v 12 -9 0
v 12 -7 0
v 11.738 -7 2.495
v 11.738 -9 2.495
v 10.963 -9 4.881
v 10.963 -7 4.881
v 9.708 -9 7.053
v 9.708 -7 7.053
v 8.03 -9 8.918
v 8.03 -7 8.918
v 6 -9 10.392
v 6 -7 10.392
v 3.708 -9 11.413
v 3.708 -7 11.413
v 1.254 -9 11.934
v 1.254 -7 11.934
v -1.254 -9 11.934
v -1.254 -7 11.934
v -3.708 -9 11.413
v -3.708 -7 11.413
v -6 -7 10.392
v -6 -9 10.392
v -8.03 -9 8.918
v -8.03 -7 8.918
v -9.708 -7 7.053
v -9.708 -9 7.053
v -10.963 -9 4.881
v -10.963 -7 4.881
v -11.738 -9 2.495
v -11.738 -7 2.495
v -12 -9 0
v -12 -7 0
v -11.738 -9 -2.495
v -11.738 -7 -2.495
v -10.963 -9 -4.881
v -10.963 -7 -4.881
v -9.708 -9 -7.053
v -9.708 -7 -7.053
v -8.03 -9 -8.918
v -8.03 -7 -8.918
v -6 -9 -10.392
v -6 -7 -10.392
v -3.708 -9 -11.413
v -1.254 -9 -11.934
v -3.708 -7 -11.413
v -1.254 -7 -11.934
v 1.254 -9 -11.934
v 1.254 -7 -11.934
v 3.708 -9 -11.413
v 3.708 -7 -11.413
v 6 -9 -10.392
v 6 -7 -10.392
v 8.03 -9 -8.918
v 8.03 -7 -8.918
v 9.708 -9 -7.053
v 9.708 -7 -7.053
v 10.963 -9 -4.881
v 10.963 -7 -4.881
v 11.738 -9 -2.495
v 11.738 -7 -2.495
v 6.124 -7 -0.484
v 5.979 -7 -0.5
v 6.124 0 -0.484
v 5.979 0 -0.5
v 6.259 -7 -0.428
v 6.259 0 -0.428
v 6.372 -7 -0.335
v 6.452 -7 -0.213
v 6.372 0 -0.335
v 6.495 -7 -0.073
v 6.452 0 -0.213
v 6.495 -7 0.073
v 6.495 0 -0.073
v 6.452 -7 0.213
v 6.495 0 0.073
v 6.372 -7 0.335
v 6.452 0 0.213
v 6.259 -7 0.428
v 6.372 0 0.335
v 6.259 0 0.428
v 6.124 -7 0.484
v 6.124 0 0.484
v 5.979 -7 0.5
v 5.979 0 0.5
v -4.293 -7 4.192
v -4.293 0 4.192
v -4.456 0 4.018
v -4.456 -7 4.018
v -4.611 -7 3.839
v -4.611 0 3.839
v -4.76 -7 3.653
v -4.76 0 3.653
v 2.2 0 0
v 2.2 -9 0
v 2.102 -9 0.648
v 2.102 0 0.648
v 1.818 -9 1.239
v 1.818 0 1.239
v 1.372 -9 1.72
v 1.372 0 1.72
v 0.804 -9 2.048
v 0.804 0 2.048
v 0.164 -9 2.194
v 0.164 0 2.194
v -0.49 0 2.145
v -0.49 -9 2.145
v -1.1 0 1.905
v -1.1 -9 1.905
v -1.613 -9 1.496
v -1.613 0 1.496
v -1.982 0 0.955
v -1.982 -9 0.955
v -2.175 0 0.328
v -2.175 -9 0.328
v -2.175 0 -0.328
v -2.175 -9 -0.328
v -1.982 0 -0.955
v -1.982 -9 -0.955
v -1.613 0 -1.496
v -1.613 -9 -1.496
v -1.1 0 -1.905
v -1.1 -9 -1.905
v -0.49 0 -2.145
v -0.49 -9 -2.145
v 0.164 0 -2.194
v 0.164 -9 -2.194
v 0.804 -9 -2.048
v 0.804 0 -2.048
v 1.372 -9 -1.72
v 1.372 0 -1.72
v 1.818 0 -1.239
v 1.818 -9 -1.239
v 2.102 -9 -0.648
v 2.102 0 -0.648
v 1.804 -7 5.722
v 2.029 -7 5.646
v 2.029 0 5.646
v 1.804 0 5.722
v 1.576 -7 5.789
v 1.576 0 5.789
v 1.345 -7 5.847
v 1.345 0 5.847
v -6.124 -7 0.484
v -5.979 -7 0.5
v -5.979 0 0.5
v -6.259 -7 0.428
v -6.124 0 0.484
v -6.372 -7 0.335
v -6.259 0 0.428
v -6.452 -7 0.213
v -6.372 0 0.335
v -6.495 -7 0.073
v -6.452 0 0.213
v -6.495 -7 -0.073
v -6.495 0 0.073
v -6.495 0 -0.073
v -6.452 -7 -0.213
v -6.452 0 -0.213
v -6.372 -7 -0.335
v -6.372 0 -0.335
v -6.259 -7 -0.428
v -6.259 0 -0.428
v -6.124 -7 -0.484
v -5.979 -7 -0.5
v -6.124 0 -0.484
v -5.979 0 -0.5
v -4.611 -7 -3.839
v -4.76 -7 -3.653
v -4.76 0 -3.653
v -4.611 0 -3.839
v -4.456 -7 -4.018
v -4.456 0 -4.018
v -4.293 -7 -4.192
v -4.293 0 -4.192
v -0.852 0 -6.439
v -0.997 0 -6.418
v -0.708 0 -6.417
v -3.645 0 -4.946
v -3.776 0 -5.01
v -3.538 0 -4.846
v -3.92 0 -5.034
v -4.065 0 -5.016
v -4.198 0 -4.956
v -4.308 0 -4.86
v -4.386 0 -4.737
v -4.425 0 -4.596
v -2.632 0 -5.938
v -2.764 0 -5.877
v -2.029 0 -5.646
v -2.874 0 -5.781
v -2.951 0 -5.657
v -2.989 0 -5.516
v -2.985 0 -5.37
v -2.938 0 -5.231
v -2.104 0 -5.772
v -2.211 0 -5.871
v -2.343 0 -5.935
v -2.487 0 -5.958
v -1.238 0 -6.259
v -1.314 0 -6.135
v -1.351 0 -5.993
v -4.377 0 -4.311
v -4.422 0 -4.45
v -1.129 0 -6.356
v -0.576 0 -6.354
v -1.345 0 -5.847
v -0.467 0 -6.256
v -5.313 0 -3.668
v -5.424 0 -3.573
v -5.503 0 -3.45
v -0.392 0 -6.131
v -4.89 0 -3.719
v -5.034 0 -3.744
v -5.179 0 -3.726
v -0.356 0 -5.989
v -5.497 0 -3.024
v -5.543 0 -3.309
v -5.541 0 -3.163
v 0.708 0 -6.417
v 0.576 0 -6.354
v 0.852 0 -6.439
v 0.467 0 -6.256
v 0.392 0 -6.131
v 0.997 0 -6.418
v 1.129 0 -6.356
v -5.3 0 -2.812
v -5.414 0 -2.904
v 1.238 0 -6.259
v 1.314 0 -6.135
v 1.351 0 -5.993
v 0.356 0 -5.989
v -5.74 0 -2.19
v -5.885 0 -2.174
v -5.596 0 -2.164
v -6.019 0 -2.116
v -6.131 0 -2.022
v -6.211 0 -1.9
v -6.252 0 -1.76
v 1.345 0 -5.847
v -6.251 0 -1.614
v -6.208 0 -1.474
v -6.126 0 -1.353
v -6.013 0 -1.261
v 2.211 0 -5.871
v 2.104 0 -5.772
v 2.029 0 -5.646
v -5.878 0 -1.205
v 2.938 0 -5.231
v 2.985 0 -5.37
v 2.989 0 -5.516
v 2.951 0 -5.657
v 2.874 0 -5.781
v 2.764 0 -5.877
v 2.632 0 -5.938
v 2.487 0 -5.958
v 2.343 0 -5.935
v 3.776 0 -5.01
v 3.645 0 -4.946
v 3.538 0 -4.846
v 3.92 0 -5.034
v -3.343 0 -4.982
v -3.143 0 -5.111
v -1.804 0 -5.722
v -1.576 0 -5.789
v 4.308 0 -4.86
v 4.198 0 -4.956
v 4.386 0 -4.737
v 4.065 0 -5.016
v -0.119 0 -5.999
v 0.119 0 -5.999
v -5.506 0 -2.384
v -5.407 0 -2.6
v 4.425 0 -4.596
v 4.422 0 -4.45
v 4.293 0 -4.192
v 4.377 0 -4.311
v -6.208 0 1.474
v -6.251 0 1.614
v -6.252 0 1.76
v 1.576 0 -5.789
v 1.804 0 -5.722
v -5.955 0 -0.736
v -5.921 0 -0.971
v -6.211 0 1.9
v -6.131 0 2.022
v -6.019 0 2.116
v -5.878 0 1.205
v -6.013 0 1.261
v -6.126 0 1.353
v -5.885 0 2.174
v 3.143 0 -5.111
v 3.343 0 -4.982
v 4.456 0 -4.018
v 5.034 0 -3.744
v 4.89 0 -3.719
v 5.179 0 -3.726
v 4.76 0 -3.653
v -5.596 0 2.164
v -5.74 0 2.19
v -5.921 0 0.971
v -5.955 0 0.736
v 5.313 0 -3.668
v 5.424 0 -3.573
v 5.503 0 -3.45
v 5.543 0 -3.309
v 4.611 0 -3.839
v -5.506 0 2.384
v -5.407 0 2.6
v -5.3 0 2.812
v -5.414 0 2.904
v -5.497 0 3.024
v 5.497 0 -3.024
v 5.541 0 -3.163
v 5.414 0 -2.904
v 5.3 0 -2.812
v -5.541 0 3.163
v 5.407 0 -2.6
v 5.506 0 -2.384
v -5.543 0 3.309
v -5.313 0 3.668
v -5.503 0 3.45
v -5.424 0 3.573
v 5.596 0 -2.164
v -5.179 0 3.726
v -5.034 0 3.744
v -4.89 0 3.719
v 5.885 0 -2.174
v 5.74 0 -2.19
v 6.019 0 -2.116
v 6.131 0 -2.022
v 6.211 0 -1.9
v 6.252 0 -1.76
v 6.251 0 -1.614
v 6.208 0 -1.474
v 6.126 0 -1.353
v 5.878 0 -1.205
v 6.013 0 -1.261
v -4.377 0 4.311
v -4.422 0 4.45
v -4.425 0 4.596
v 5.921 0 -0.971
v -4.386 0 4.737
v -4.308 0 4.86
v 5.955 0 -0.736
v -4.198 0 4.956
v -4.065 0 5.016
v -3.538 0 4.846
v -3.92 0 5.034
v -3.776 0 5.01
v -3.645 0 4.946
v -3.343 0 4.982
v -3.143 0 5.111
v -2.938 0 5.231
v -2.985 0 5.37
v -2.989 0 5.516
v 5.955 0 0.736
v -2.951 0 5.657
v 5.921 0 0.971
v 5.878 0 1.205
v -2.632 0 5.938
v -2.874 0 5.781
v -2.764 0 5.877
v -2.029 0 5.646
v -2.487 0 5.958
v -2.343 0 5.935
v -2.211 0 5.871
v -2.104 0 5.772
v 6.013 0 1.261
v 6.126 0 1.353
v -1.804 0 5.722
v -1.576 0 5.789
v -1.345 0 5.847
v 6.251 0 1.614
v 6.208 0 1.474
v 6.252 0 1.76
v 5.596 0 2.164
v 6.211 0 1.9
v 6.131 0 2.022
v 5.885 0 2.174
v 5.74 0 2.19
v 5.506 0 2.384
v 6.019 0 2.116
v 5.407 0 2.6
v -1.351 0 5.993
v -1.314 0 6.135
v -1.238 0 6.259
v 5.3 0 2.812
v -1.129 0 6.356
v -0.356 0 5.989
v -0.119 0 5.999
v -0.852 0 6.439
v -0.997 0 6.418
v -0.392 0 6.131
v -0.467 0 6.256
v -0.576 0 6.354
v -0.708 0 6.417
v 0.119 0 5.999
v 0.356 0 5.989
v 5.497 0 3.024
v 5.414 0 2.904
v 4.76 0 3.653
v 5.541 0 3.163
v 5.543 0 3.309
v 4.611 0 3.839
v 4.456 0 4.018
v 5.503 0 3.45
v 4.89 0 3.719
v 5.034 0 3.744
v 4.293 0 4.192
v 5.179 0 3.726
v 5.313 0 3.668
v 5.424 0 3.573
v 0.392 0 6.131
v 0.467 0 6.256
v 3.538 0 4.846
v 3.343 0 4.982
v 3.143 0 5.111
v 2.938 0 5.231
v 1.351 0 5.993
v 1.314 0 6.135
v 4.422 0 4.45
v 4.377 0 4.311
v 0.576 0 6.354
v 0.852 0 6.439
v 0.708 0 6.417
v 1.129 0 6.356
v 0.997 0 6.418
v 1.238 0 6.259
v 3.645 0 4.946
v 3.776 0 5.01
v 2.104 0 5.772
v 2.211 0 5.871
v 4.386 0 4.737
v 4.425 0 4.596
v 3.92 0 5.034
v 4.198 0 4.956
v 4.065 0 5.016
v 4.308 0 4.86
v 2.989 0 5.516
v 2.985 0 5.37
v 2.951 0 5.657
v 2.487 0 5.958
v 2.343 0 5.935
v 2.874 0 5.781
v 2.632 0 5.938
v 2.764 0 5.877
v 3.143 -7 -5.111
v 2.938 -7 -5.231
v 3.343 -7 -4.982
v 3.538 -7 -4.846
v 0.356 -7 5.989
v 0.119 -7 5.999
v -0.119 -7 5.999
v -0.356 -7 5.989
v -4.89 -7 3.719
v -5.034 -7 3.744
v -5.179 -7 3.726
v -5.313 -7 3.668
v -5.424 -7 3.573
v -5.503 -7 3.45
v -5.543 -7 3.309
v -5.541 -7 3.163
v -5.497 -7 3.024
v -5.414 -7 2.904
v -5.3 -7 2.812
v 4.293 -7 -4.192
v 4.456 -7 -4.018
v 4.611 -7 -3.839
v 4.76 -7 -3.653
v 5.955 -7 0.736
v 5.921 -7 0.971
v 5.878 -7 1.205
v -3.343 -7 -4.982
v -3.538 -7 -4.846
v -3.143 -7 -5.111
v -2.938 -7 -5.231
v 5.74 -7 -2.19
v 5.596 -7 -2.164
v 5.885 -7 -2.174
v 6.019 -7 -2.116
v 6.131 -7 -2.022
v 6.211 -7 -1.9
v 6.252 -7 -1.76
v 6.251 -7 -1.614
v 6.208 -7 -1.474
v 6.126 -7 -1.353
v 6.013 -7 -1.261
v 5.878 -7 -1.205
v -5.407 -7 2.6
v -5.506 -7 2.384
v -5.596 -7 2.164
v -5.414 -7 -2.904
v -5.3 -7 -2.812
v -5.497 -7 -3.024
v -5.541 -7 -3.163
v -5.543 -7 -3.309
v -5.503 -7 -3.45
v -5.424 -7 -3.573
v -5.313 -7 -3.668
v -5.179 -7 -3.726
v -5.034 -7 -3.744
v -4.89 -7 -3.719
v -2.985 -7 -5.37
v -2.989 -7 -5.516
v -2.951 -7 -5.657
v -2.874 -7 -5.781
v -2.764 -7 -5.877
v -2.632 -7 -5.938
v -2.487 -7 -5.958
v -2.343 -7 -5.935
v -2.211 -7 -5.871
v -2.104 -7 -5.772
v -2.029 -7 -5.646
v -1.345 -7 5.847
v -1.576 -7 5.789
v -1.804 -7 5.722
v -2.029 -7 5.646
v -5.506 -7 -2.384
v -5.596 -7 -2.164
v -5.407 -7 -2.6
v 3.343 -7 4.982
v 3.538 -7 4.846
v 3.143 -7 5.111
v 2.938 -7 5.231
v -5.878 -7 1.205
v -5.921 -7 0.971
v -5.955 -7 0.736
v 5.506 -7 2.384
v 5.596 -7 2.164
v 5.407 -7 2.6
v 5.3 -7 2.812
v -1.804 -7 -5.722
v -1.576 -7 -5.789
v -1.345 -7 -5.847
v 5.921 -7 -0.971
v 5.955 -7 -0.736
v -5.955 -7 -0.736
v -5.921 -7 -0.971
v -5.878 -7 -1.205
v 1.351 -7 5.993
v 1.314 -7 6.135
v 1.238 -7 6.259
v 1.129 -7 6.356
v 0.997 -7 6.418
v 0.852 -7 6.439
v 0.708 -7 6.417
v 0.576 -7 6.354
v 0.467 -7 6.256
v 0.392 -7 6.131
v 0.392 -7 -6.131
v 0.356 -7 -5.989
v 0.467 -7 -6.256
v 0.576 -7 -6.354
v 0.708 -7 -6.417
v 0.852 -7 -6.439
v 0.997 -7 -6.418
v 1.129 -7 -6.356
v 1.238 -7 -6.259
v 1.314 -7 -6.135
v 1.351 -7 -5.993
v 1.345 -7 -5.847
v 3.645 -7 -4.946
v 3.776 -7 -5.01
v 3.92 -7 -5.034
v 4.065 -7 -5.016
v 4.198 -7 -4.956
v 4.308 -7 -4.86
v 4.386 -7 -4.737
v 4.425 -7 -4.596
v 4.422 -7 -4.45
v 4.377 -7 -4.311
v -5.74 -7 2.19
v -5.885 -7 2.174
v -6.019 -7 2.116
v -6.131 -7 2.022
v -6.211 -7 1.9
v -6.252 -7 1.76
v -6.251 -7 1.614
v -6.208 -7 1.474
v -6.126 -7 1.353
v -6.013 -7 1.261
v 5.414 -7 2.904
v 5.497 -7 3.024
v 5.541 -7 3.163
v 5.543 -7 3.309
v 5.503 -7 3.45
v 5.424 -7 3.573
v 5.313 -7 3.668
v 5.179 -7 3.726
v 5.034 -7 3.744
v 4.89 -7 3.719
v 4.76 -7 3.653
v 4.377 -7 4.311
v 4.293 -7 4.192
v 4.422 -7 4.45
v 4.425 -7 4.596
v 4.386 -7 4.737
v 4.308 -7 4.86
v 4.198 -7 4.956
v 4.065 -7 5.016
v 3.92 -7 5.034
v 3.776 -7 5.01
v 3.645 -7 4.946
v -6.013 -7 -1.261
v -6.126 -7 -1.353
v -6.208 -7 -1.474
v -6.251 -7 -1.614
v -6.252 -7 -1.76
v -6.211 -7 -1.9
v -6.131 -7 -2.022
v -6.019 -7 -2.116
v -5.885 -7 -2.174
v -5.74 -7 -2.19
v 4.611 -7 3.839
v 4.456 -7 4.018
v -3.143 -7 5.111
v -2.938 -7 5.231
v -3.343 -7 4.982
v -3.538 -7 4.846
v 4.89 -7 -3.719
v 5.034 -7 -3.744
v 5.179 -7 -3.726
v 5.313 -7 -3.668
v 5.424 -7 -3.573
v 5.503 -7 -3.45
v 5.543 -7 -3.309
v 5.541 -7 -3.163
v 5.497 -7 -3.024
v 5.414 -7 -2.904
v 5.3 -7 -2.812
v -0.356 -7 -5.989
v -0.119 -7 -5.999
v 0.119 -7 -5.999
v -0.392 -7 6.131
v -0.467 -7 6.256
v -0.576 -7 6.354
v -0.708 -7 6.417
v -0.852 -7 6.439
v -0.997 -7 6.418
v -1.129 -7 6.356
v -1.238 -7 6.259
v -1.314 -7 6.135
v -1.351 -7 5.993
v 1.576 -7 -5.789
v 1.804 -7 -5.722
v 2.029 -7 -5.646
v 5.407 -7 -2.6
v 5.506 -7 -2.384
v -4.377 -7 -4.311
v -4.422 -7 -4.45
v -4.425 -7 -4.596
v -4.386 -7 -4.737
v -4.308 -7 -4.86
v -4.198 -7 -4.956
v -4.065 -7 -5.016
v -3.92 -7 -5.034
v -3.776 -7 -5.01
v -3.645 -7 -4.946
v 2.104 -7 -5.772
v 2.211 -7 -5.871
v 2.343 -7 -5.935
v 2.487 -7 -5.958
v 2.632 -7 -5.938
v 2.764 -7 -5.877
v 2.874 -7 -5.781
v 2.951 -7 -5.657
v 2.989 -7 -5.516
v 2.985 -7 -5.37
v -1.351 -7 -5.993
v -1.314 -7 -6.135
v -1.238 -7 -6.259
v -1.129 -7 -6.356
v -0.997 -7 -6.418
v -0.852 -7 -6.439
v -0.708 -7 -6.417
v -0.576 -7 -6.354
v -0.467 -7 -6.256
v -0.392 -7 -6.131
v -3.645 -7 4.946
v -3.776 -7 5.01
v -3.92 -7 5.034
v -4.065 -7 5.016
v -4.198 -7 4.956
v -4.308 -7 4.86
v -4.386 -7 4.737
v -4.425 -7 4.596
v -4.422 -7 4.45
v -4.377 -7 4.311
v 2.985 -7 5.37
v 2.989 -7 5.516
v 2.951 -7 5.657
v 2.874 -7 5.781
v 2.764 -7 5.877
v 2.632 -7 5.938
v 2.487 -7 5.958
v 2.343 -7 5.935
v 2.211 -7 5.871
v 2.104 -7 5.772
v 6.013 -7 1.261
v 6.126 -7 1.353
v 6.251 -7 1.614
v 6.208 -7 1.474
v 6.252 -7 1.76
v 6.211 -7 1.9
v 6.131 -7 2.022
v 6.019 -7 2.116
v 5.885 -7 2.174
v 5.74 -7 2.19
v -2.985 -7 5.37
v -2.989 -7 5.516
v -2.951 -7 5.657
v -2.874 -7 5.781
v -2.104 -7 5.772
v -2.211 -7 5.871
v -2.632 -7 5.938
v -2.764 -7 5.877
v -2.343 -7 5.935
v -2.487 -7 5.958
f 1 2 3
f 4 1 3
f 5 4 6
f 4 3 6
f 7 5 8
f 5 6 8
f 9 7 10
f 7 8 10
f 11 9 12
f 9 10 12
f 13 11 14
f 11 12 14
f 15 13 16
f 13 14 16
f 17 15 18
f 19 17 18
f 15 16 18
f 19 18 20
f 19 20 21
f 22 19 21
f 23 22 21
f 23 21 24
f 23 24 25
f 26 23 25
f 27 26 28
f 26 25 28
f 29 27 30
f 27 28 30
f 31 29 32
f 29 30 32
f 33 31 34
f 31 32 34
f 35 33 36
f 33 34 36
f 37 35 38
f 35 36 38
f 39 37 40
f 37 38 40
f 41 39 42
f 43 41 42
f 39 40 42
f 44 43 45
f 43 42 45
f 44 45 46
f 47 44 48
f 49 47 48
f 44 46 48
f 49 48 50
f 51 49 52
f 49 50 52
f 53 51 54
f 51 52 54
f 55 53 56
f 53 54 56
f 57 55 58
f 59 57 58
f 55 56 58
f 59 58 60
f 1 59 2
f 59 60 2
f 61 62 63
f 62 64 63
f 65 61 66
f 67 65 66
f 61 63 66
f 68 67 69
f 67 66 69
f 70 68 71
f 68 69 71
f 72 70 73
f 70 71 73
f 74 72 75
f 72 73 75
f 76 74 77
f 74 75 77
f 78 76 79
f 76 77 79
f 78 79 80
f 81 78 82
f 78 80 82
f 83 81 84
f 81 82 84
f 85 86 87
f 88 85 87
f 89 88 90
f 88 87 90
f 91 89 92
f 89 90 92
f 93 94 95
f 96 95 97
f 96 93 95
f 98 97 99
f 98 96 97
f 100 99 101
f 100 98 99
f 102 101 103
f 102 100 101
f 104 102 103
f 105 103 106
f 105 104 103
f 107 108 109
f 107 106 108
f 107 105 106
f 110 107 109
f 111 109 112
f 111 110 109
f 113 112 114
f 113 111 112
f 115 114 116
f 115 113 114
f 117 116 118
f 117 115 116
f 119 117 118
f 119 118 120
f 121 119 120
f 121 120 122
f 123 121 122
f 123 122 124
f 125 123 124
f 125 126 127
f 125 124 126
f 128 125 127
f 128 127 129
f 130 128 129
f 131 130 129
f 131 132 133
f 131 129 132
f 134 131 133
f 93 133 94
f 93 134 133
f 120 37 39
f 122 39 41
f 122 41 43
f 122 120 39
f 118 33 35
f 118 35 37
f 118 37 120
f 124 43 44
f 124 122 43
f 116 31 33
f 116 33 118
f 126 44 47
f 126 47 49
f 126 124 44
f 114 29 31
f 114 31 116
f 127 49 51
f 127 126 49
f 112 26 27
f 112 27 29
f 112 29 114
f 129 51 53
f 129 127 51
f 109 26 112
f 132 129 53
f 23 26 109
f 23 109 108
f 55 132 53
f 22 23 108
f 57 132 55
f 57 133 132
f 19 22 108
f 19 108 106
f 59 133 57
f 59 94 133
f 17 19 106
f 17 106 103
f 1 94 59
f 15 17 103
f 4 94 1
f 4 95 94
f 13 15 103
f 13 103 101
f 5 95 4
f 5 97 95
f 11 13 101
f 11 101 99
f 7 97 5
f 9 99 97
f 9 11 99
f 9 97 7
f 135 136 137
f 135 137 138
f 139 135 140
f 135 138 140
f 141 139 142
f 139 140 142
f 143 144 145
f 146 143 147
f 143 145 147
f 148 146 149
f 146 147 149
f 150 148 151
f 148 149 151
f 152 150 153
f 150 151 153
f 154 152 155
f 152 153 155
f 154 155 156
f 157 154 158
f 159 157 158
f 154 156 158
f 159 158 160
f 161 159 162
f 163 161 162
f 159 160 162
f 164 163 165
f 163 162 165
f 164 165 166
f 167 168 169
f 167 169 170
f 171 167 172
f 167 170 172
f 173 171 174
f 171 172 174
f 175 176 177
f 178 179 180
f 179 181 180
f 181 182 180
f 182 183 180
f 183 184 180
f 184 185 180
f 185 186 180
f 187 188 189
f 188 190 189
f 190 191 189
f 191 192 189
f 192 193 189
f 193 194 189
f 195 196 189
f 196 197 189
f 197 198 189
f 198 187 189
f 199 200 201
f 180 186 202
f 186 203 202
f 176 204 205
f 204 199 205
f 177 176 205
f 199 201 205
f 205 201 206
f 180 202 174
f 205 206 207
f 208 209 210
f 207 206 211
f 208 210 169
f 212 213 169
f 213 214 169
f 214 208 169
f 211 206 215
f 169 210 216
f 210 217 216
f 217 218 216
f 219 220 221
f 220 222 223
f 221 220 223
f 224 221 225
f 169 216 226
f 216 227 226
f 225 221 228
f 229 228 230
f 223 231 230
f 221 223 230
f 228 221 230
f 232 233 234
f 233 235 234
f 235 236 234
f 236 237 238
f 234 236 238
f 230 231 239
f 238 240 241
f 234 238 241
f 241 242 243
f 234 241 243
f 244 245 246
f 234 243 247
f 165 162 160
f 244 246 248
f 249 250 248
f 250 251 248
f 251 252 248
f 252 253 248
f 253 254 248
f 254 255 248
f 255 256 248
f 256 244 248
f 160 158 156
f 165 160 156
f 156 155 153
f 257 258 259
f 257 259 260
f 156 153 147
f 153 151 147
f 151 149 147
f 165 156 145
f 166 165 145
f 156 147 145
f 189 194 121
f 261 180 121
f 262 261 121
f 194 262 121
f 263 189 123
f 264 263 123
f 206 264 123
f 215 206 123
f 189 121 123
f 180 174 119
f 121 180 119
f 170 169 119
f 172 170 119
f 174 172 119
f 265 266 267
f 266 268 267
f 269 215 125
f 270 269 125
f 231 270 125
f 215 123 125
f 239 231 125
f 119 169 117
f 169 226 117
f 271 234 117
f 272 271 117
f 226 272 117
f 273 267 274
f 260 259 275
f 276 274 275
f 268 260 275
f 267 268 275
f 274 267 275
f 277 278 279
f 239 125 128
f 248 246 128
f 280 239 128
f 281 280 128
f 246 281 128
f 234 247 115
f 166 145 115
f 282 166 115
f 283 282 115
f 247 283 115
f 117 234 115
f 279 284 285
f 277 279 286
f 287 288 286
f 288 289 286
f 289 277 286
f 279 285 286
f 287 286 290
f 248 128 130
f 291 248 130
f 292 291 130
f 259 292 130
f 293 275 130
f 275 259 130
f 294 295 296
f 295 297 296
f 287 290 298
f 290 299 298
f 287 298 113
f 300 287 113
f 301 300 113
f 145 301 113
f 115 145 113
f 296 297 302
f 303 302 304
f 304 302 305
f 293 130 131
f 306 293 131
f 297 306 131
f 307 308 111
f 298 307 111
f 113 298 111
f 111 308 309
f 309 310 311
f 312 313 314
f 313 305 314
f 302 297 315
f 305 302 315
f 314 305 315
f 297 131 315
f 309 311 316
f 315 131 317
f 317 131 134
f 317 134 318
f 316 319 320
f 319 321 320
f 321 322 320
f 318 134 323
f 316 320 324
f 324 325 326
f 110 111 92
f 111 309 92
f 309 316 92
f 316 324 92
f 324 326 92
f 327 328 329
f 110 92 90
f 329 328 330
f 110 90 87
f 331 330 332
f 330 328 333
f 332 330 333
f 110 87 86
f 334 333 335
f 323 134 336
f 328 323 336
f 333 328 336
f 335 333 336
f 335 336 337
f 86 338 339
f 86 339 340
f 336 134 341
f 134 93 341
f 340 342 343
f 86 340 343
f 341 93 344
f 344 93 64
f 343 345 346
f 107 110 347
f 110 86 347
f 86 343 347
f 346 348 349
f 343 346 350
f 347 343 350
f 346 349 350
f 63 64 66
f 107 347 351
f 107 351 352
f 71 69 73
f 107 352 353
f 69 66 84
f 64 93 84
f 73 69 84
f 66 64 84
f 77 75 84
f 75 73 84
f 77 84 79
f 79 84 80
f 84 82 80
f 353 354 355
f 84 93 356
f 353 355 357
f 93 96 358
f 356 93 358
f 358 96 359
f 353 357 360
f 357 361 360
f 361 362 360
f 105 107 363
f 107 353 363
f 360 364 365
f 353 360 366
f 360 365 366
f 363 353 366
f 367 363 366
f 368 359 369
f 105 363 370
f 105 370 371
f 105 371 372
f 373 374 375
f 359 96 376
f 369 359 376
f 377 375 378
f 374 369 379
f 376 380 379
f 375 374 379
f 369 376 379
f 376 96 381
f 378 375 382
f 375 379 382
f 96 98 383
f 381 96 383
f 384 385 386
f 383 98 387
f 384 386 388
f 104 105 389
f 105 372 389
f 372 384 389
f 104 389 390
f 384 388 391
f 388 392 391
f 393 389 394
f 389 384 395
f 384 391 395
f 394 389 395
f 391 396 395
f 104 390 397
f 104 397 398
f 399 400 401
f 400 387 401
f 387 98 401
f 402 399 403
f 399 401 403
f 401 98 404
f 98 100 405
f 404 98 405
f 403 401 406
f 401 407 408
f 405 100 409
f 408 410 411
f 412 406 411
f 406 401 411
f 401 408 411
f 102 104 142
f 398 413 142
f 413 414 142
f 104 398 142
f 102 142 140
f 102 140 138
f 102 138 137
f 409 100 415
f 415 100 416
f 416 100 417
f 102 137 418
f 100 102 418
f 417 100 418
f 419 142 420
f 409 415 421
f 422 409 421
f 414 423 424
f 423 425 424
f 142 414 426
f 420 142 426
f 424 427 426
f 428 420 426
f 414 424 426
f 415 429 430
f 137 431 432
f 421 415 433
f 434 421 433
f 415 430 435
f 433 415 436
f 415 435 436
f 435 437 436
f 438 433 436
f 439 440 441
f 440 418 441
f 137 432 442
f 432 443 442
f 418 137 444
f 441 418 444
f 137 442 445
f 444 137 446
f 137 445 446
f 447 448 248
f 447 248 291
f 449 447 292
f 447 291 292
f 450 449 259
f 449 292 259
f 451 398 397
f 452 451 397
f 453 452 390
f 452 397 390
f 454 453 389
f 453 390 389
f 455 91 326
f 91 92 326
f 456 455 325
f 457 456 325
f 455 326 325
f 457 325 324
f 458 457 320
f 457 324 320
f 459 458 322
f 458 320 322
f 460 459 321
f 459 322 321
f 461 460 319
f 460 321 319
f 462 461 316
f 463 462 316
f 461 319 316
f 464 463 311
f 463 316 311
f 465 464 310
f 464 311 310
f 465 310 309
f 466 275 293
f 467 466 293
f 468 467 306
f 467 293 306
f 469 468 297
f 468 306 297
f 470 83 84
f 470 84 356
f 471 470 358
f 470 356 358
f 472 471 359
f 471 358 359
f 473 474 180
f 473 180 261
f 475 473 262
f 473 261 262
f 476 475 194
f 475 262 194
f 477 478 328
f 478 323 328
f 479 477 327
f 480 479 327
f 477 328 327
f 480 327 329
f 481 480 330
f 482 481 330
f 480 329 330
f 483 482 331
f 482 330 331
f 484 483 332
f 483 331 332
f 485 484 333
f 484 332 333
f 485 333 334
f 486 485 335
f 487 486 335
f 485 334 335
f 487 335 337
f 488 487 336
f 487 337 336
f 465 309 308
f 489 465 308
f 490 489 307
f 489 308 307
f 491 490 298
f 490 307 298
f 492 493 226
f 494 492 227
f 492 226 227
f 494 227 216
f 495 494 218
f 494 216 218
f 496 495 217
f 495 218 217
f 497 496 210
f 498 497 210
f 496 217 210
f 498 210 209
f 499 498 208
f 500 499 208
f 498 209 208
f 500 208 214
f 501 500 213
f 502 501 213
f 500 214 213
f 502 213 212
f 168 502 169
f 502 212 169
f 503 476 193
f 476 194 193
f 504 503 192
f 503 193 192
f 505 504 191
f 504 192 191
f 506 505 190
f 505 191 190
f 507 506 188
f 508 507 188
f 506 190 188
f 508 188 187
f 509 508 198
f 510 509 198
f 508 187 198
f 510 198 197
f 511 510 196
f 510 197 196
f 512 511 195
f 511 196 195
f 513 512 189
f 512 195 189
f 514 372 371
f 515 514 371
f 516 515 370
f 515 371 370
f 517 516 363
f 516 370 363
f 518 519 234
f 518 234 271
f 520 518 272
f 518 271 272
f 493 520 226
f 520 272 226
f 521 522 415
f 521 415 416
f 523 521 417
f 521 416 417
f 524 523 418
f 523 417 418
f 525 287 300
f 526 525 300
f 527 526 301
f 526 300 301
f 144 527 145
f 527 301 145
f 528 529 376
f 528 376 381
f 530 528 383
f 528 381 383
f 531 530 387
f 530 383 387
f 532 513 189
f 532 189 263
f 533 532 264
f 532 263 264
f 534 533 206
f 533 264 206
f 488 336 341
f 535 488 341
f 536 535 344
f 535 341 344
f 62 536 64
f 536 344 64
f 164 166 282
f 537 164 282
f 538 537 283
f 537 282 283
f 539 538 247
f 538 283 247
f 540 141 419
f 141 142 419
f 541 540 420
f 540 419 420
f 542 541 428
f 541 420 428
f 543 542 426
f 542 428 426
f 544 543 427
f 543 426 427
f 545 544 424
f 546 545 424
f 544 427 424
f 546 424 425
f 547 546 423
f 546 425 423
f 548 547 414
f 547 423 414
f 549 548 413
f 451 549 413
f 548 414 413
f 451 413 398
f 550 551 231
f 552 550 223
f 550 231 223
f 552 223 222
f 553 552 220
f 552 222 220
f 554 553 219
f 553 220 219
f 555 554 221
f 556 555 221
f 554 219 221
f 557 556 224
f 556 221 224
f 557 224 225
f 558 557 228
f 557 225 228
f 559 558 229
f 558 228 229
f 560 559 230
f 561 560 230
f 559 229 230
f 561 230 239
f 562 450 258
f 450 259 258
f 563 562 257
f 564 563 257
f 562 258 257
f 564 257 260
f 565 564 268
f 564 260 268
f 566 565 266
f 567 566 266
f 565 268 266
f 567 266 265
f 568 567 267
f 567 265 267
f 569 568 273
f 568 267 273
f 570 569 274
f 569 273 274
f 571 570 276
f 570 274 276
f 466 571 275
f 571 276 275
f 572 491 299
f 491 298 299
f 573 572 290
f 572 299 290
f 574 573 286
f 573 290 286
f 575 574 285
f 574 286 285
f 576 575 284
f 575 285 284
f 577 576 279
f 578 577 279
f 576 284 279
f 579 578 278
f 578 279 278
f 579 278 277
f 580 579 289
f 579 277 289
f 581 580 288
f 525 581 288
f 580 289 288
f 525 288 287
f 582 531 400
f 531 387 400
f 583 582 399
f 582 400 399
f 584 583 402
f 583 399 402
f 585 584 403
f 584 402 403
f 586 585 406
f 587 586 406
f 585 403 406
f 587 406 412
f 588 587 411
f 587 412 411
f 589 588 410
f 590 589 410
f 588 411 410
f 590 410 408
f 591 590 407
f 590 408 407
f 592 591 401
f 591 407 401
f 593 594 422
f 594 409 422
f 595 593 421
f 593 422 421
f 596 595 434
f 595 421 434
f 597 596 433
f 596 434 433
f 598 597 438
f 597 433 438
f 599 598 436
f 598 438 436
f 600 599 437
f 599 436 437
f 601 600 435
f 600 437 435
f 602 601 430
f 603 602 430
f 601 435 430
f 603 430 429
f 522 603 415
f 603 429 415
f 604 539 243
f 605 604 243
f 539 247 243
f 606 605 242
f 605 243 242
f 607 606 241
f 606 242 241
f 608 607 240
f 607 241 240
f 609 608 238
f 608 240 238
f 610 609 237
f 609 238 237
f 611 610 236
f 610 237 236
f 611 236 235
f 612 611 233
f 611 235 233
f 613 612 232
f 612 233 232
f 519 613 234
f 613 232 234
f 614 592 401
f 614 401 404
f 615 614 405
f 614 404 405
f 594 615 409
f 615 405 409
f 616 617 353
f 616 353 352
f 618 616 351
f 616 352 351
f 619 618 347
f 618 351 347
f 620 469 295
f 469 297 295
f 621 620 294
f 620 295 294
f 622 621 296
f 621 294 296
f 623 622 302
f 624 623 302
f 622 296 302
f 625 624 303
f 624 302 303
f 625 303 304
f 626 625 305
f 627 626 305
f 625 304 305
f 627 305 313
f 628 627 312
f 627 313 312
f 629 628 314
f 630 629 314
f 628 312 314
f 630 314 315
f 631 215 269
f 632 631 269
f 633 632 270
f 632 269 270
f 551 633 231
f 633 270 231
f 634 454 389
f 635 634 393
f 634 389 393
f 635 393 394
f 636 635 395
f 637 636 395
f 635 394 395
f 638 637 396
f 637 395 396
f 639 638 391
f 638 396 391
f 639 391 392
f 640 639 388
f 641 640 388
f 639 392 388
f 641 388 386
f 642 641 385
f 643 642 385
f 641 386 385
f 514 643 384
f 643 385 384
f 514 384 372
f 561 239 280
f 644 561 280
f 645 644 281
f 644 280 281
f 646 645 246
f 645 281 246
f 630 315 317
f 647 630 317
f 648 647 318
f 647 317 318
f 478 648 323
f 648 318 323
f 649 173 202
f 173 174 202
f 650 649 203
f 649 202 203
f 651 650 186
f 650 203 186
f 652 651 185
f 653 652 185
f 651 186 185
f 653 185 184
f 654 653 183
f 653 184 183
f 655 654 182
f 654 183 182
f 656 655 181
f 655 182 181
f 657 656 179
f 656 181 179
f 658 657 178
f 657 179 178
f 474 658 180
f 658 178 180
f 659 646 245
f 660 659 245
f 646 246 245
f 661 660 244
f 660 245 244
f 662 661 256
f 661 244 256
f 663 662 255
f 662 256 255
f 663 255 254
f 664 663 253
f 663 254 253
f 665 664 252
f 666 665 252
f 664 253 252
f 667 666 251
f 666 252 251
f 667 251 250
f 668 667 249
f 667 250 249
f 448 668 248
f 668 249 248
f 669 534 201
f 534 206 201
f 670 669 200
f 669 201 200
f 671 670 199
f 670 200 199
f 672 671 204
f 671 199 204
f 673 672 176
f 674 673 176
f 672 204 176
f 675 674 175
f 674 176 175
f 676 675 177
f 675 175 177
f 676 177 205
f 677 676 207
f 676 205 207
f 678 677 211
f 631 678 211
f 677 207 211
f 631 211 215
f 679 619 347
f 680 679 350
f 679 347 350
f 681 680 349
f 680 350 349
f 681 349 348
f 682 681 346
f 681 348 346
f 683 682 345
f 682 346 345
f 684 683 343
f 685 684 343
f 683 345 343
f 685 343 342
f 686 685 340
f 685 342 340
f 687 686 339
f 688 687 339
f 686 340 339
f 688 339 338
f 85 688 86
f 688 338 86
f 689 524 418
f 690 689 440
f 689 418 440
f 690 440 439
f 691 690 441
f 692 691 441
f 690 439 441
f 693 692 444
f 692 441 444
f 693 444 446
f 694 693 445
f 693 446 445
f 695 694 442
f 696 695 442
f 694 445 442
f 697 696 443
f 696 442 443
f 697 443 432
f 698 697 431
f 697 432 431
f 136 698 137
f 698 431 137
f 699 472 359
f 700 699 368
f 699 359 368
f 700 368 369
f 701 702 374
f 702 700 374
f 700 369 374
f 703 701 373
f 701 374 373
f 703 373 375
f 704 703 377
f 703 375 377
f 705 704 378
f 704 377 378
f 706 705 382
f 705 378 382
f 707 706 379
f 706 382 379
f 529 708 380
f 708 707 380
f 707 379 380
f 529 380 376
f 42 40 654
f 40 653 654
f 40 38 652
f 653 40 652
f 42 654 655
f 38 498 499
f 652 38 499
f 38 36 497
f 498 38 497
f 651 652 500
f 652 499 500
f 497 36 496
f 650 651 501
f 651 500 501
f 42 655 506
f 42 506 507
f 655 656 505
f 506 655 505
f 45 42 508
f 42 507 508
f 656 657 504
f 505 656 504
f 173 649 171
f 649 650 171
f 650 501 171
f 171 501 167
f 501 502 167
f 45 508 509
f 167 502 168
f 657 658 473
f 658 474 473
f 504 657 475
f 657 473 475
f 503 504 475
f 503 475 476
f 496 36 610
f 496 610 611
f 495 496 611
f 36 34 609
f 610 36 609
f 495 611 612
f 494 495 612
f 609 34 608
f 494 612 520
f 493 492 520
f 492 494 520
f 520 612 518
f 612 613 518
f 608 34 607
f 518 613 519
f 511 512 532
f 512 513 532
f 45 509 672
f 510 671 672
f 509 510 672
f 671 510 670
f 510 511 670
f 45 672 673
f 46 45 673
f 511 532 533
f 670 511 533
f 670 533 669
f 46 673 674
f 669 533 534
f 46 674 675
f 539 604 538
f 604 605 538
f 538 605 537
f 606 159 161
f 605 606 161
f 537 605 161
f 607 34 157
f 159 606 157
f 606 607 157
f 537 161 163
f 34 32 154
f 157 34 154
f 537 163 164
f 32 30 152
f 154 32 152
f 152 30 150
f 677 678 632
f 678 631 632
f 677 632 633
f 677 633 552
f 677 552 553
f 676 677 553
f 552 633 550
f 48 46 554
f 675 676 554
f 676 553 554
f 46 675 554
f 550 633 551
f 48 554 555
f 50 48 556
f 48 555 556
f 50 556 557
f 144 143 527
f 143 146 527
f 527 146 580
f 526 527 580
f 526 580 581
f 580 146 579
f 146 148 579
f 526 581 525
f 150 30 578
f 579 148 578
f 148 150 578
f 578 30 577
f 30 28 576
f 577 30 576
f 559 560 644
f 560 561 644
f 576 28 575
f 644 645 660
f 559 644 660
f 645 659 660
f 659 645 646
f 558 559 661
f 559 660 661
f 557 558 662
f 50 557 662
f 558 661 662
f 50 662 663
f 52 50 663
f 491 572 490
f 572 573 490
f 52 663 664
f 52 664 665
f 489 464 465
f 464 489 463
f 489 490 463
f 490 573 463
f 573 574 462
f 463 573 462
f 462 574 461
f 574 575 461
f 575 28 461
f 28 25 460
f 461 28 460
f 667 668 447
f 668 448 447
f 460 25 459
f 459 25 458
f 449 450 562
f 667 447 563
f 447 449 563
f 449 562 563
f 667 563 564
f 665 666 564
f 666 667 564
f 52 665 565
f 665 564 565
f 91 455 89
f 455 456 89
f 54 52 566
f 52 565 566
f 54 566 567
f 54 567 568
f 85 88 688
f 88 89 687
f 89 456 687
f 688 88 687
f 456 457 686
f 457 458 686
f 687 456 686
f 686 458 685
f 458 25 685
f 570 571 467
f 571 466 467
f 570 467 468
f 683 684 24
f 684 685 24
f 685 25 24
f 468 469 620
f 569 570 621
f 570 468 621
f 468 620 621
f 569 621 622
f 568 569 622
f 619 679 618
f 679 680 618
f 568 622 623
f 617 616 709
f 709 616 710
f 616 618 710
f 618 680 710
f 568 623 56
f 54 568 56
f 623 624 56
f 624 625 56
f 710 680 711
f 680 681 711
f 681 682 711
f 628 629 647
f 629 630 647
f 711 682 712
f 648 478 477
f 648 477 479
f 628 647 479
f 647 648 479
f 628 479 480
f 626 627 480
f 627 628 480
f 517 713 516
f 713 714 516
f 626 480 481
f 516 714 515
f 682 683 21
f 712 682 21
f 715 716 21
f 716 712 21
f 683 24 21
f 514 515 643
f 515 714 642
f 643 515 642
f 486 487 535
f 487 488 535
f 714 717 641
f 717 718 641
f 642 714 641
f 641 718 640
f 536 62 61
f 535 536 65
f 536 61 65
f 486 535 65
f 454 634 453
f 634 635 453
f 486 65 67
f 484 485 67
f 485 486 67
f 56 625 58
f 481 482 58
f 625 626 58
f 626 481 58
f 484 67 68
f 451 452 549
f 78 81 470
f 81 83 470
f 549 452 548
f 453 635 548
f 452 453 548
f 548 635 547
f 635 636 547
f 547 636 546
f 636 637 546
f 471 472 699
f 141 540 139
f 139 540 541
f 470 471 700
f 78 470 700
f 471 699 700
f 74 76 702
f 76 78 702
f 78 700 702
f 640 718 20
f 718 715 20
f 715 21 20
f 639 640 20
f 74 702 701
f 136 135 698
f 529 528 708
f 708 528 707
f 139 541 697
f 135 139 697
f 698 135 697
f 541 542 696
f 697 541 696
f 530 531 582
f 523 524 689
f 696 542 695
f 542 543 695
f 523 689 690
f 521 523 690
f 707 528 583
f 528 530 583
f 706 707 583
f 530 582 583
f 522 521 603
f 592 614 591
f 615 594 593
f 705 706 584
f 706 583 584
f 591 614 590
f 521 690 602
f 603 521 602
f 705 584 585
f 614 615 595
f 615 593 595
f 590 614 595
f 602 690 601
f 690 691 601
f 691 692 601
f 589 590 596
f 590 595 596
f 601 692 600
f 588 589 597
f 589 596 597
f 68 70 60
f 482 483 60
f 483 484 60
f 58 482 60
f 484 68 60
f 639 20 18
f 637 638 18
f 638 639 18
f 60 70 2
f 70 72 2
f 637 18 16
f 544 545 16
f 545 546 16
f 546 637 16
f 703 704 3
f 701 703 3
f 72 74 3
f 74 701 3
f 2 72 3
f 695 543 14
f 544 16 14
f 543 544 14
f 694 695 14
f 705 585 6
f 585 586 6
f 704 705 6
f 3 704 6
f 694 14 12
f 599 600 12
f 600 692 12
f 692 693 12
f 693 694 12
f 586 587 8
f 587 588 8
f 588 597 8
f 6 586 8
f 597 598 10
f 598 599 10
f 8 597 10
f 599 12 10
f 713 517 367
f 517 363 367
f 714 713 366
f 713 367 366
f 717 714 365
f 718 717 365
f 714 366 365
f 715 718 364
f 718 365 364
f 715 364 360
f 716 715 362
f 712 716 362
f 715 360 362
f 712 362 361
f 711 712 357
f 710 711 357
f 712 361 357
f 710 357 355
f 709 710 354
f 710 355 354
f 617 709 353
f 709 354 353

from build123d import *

# Parameters (mm, degrees)
CYLINDER011007_R     = 2.2
CYLINDER011007_DEPTH = 20
CYLINDER011006_R     = 12
CYLINDER011006_DEPTH = 2
CYLINDER011009_R     = 0.5
CYLINDER011009_DEPTH = 7
ARRAY007_COUNT       = 22
CYLINDER011005_R     = 6
CYLINDER011005_DEPTH = 7


with BuildPart() as belt_attach_insert_hole:
    # Cylinder011007 → Cylinder011007 (new body)
    with BuildSketch(Plane.XZ):
        Circle(CYLINDER011007_R)
    extrude(amount=CYLINDER011007_DEPTH)


with BuildPart() as belt_disk:
    # Cylinder011006 → Cylinder011006 (new body)
    with BuildSketch(Plane.XZ.offset(7)):
        Circle(CYLINDER011006_R)
    extrude(amount=CYLINDER011006_DEPTH)


with BuildPart() as belt_pin_array:
    # Cylinder011009 → Cylinder011009 (new body)
    with BuildSketch(Plane(origin=(6, 0, 0), x_dir=(1, 0, 0), z_dir=(0, -1, 0))):
        Circle(CYLINDER011009_R)
    extrude(amount=CYLINDER011009_DEPTH)

    # Array007: belt pin array ×22 about axis
    array007_axis = Axis((0, 0, 0), (0, 1, 0))


with BuildPart() as belt_pin_array_1:
    add(belt_pin_array.part)
    for i in range(1, ARRAY007_COUNT):
        add(belt_pin_array.part.rotate(array007_axis, i * 360 / ARRAY007_COUNT))


with BuildPart() as belt_attach_cut:
    # Cylinder011005 → Cylinder011005 (new body)
    with BuildSketch(Plane.XZ):
        Circle(CYLINDER011005_R)
    extrude(amount=CYLINDER011005_DEPTH)

    # Fusion003: union belt disk, belt pin array
    add(belt_disk.part)
    add(belt_pin_array_1.part)

    # Cut023015009007: cut belt attach insert hole
    add(belt_attach_insert_hole.part, mode=Mode.SUBTRACT)


solid = belt_attach_cut.part
